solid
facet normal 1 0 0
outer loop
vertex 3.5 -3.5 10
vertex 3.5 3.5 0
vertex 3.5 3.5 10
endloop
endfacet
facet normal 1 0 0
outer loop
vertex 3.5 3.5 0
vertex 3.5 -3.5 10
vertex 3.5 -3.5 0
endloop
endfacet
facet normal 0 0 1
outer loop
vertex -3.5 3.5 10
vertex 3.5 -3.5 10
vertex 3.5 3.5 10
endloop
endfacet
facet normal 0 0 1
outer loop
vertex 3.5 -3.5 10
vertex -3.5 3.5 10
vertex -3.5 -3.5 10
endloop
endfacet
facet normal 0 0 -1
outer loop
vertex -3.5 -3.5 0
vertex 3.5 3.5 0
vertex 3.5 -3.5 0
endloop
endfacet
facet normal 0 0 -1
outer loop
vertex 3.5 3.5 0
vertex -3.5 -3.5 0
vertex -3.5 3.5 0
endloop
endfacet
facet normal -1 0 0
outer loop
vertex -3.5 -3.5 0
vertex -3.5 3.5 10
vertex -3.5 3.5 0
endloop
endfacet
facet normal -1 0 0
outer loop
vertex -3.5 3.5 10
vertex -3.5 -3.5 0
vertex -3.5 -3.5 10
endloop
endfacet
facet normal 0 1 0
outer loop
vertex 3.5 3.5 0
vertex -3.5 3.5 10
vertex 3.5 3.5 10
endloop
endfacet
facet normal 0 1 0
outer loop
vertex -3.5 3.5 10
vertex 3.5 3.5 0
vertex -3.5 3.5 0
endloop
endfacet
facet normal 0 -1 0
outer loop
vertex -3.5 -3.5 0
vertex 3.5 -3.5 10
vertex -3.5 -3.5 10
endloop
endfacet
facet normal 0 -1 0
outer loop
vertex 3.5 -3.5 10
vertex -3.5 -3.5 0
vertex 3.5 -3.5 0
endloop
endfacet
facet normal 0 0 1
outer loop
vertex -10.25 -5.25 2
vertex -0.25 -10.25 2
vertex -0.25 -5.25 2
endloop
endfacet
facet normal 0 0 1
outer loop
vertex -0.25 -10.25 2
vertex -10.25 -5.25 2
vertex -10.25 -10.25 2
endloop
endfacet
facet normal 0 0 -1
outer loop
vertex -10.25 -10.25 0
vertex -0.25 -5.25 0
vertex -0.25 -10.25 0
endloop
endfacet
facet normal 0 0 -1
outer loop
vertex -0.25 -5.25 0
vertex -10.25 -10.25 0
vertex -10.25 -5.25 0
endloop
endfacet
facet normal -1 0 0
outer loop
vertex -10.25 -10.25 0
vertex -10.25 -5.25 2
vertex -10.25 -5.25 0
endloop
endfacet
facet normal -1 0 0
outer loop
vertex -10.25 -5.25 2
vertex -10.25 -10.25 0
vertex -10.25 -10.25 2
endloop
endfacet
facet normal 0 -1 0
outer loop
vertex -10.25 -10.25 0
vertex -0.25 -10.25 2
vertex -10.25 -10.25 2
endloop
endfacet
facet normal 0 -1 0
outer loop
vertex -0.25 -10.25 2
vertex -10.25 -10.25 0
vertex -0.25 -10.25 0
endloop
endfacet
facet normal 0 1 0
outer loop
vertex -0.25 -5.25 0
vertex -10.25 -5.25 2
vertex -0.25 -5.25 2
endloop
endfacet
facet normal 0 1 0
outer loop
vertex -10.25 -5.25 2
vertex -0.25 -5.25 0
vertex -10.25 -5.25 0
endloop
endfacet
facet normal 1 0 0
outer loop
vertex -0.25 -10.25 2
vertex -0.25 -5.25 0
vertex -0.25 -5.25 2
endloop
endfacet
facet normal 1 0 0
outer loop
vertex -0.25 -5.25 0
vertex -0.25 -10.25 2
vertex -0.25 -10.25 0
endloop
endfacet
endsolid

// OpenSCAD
translate([0, 0, 5]) color([0,1,0,0.9]) cube([7, 7, 10], center=true);
translate([-10.0, -10.0, 1]) color([1,0,0]) cube([0.5, 0.5, 2], center=true);
translate([-10.0, -9.5, 1]) color([1,0,0]) cube([0.5, 0.5, 2], center=true);
translate([-10.0, -9.0, 1]) color([1,0,0]) cube([0.5, 0.5, 2], center=true);
translate([-10.0, -8.5, 1]) color([1,0,0]) cube([0.5, 0.5, 2], center=true);
translate([-10.0, -8.0, 1]) color([1,0,0]) cube([0.5, 0.5, 2], center=true);
translate([-10.0, -7.5, 1]) color([1,0,0]) cube([0.5, 0.5, 2], center=true);
translate([-10.0, -7.0, 1]) color([1,0,0]) cube([0.5, 0.5, 2], center=true);
translate([-10.0, -6.5, 1]) color([1,0,0]) cube([0.5, 0.5, 2], center=true);
translate([-10.0, -6.0, 1]) color([1,0,0]) cube([0.5, 0.5, 2], center=true);
translate([-10.0, -5.5, 1]) color([1,0,0]) cube([0.5, 0.5, 2], center=true);
translate([-9.5, -10.0, 1]) color([1,0,0]) cube([0.5, 0.5, 2], center=true);
translate([-9.5, -9.5, 1]) color([1,0,0]) cube([0.5, 0.5, 2], center=true);
translate([-9.5, -9.0, 1]) color([1,0,0]) cube([0.5, 0.5, 2], center=true);
translate([-9.5, -8.5, 1]) color([1,0,0]) cube([0.5, 0.5, 2], center=true);
translate([-9.5, -8.0, 1]) color([1,0,0]) cube([0.5, 0.5, 2], center=true);
translate([-9.5, -7.5, 1]) color([1,0,0]) cube([0.5, 0.5, 2], center=true);
translate([-9.5, -7.0, 1]) color([1,0,0]) cube([0.5, 0.5, 2], center=true);
translate([-9.5, -6.5, 1]) color([1,0,0]) cube([0.5, 0.5, 2], center=true);
translate([-9.5, -6.0, 1]) color([1,0,0]) cube([0.5, 0.5, 2], center=true);
translate([-9.5, -5.5, 1]) color([1,0,0]) cube([0.5, 0.5, 2], center=true);
translate([-9.0, -10.0, 1]) color([1,0,0]) cube([0.5, 0.5, 2], center=true);
translate([-9.0, -9.5, 1]) color([1,0,0]) cube([0.5, 0.5, 2], center=true);
translate([-9.0, -9.0, 1]) color([1,0,0]) cube([0.5, 0.5, 2], center=true);
translate([-9.0, -8.5, 1]) color([1,0,0]) cube([0.5, 0.5, 2], center=true);
translate([-9.0, -8.0, 1]) color([1,0,0]) cube([0.5, 0.5, 2], center=true);
translate([-9.0, -7.5, 1]) color([1,0,0]) cube([0.5, 0.5, 2], center=true);
translate([-9.0, -7.0, 1]) color([1,0,0]) cube([0.5, 0.5, 2], center=true);
translate([-9.0, -6.5, 1]) color([1,0,0]) cube([0.5, 0.5, 2], center=true);
translate([-9.0, -6.0, 1]) color([1,0,0]) cube([0.5, 0.5, 2], center=true);
translate([-9.0, -5.5, 1]) color([1,0,0]) cube([0.5, 0.5, 2], center=true);
translate([-8.5, -10.0, 1]) color([1,0,0]) cube([0.5, 0.5, 2], center=true);
translate([-8.5, -9.5, 1]) color([1,0,0]) cube([0.5, 0.5, 2], center=true);
translate([-8.5, -9.0, 1]) color([1,0,0]) cube([0.5, 0.5, 2], center=true);
translate([-8.5, -8.5, 1]) color([1,0,0]) cube([0.5, 0.5, 2], center=true);
translate([-8.5, -8.0, 1]) color([1,0,0]) cube([0.5, 0.5, 2], center=true);
translate([-8.5, -7.5, 1]) color([1,0,0]) cube([0.5, 0.5, 2], center=true);
translate([-8.5, -7.0, 1]) color([1,0,0]) cube([0.5, 0.5, 2], center=true);
translate([-8.5, -6.5, 1]) color([1,0,0]) cube([0.5, 0.5, 2], center=true);
translate([-8.5, -6.0, 1]) color([1,0,0]) cube([0.5, 0.5, 2], center=true);
translate([-8.5, -5.5, 1]) color([1,0,0]) cube([0.5, 0.5, 2], center=true);
translate([-8.0, -10.0, 1]) color([1,0,0]) cube([0.5, 0.5, 2], center=true);
translate([-8.0, -9.5, 1]) color([1,0,0]) cube([0.5, 0.5, 2], center=true);
translate([-8.0, -9.0, 1]) color([1,0,0]) cube([0.5, 0.5, 2], center=true);
translate([-8.0, -8.5, 1]) color([1,0,0]) cube([0.5, 0.5, 2], center=true);
translate([-8.0, -8.0, 1]) color([1,0,0]) cube([0.5, 0.5, 2], center=true);
translate([-8.0, -7.5, 1]) color([1,0,0]) cube([0.5, 0.5, 2], center=true);
translate([-8.0, -7.0, 1]) color([1,0,0]) cube([0.5, 0.5, 2], center=true);
translate([-8.0, -6.5, 1]) color([1,0,0]) cube([0.5, 0.5, 2], center=true);
translate([-8.0, -6.0, 1]) color([1,0,0]) cube([0.5, 0.5, 2], center=true);
translate([-8.0, -5.5, 1]) color([1,0,0]) cube([0.5, 0.5, 2], center=true);
translate([-7.5, -10.0, 1]) color([1,0,0]) cube([0.5, 0.5, 2], center=true);
translate([-7.5, -9.5, 1]) color([1,0,0]) cube([0.5, 0.5, 2], center=true);
translate([-7.5, -9.0, 1]) color([1,0,0]) cube([0.5, 0.5, 2], center=true);
translate([-7.5, -8.5, 1]) color([1,0,0]) cube([0.5, 0.5, 2], center=true);
translate([-7.5, -8.0, 1]) color([1,0,0]) cube([0.5, 0.5, 2], center=true);
translate([-7.5, -7.5, 1]) color([1,0,0]) cube([0.5, 0.5, 2], center=true);
translate([-7.5, -7.0, 1]) color([1,0,0]) cube([0.5, 0.5, 2], center=true);
translate([-7.5, -6.5, 1]) color([1,0,0]) cube([0.5, 0.5, 2], center=true);
translate([-7.5, -6.0, 1]) color([1,0,0]) cube([0.5, 0.5, 2], center=true);
translate([-7.5, -5.5, 1]) color([1,0,0]) cube([0.5, 0.5, 2], center=true);
translate([-7.0, -10.0, 1]) color([1,0,0]) cube([0.5, 0.5, 2], center=true);
translate([-7.0, -9.5, 1]) color([1,0,0]) cube([0.5, 0.5, 2], center=true);
translate([-7.0, -9.0, 1]) color([1,0,0]) cube([0.5, 0.5, 2], center=true);
translate([-7.0, -8.5, 1]) color([1,0,0]) cube([0.5, 0.5, 2], center=true);
translate([-7.0, -8.0, 1]) color([1,0,0]) cube([0.5, 0.5, 2], center=true);
translate([-7.0, -7.5, 1]) color([1,0,0]) cube([0.5, 0.5, 2], center=true);
translate([-7.0, -7.0, 1]) color([1,0,0]) cube([0.5, 0.5, 2], center=true);
translate([-7.0, -6.5, 1]) color([1,0,0]) cube([0.5, 0.5, 2], center=true);
translate([-7.0, -6.0, 1]) color([1,0,0]) cube([0.5, 0.5, 2], center=true);
translate([-7.0, -5.5, 1]) color([1,0,0]) cube([0.5, 0.5, 2], center=true);
translate([-6.5, -10.0, 1]) color([1,0,0]) cube([0.5, 0.5, 2], center=true);
translate([-6.5, -9.5, 1]) color([1,0,0]) cube([0.5, 0.5, 2], center=true);
translate([-6.5, -9.0, 1]) color([1,0,0]) cube([0.5, 0.5, 2], center=true);
translate([-6.5, -8.5, 1]) color([1,0,0]) cube([0.5, 0.5, 2], center=true);
translate([-6.5, -8.0, 1]) color([1,0,0]) cube([0.5, 0.5, 2], center=true);
translate([-6.5, -7.5, 1]) color([1,0,0]) cube([0.5, 0.5, 2], center=true);
translate([-6.5, -7.0, 1]) color([1,0,0]) cube([0.5, 0.5, 2], center=true);
translate([-6.5, -6.5, 1]) color([1,0,0]) cube([0.5, 0.5, 2], center=true);
translate([-6.5, -6.0, 1]) color([1,0,0]) cube([0.5, 0.5, 2], center=true);
translate([-6.5, -5.5, 1]) color([1,0,0]) cube([0.5, 0.5, 2], center=true);
translate([-6.0, -10.0, 1]) color([1,0,0]) cube([0.5, 0.5, 2], center=true);
translate([-6.0, -9.5, 1]) color([1,0,0]) cube([0.5, 0.5, 2], center=true);
translate([-6.0, -9.0, 1]) color([1,0,0]) cube([0.5, 0.5, 2], center=true);
translate([-6.0, -8.5, 1]) color([1,0,0]) cube([0.5, 0.5, 2], center=true);
translate([-6.0, -8.0, 1]) color([1,0,0]) cube([0.5, 0.5, 2], center=true);
translate([-6.0, -7.5, 1]) color([1,0,0]) cube([0.5, 0.5, 2], center=true);
translate([-6.0, -7.0, 1]) color([1,0,0]) cube([0.5, 0.5, 2], center=true);
translate([-6.0, -6.5, 1]) color([1,0,0]) cube([0.5, 0.5, 2], center=true);
translate([-6.0, -6.0, 1]) color([1,0,0]) cube([0.5, 0.5, 2], center=true);
translate([-6.0, -5.5, 1]) color([1,0,0]) cube([0.5, 0.5, 2], center=true);
translate([-5.5, -10.0, 1]) color([1,0,0]) cube([0.5, 0.5, 2], center=true);
translate([-5.5, -9.5, 1]) color([1,0,0]) cube([0.5, 0.5, 2], center=true);
translate([-5.5, -9.0, 1]) color([1,0,0]) cube([0.5, 0.5, 2], center=true);
translate([-5.5, -8.5, 1]) color([1,0,0]) cube([0.5, 0.5, 2], center=true);
translate([-5.5, -8.0, 1]) color([1,0,0]) cube([0.5, 0.5, 2], center=true);
translate([-5.5, -7.5, 1]) color([1,0,0]) cube([0.5, 0.5, 2], center=true);
translate([-5.5, -7.0, 1]) color([1,0,0]) cube([0.5, 0.5, 2], center=true);
translate([-5.5, -6.5, 1]) color([1,0,0]) cube([0.5, 0.5, 2], center=true);
translate([-5.5, -6.0, 1]) color([1,0,0]) cube([0.5, 0.5, 2], center=true);
translate([-5.5, -5.5, 1]) color([1,0,0]) cube([0.5, 0.5, 2], center=true);
translate([-5.0, -10.0, 1]) color([1,0,0]) cube([0.5, 0.5, 2], center=true);
translate([-5.0, -9.5, 1]) color([1,0,0]) cube([0.5, 0.5, 2], center=true);
translate([-5.0, -9.0, 1]) color([1,0,0]) cube([0.5, 0.5, 2], center=true);
translate([-5.0, -8.5, 1]) color([1,0,0]) cube([0.5, 0.5, 2], center=true);
translate([-5.0, -8.0, 1]) color([1,0,0]) cube([0.5, 0.5, 2], center=true);
translate([-5.0, -7.5, 1]) color([1,0,0]) cube([0.5, 0.5, 2], center=true);
translate([-5.0, -7.0, 1]) color([1,0,0]) cube([0.5, 0.5, 2], center=true);
translate([-5.0, -6.5, 1]) color([1,0,0]) cube([0.5, 0.5, 2], center=true);
translate([-5.0, -6.0, 1]) color([1,0,0]) cube([0.5, 0.5, 2], center=true);
translate([-5.0, -5.5, 1]) color([1,0,0]) cube([0.5, 0.5, 2], center=true);
translate([-4.5, -10.0, 1]) color([1,0,0]) cube([0.5, 0.5, 2], center=true);
translate([-4.5, -9.5, 1]) color([1,0,0]) cube([0.5, 0.5, 2], center=true);
translate([-4.5, -9.0, 1]) color([1,0,0]) cube([0.5, 0.5, 2], center=true);
translate([-4.5, -8.5, 1]) color([1,0,0]) cube([0.5, 0.5, 2], center=true);
translate([-4.5, -8.0, 1]) color([1,0,0]) cube([0.5, 0.5, 2], center=true);
translate([-4.5, -7.5, 1]) color([1,0,0]) cube([0.5, 0.5, 2], center=true);
translate([-4.5, -7.0, 1]) color([1,0,0]) cube([0.5, 0.5, 2], center=true);
translate([-4.5, -6.5, 1]) color([1,0,0]) cube([0.5, 0.5, 2], center=true);
translate([-4.5, -6.0, 1]) color([1,0,0]) cube([0.5, 0.5, 2], center=true);
translate([-4.5, -5.5, 1]) color([1,0,0]) cube([0.5, 0.5, 2], center=true);
translate([-4.0, -10.0, 1]) color([1,0,0]) cube([0.5, 0.5, 2], center=true);
translate([-4.0, -9.5, 1]) color([1,0,0]) cube([0.5, 0.5, 2], center=true);
translate([-4.0, -9.0, 1]) color([1,0,0]) cube([0.5, 0.5, 2], center=true);
translate([-4.0, -8.5, 1]) color([1,0,0]) cube([0.5, 0.5, 2], center=true);
translate([-4.0, -8.0, 1]) color([1,0,0]) cube([0.5, 0.5, 2], center=true);
translate([-4.0, -7.5, 1]) color([1,0,0]) cube([0.5, 0.5, 2], center=true);
translate([-4.0, -7.0, 1]) color([1,0,0]) cube([0.5, 0.5, 2], center=true);
translate([-4.0, -6.5, 1]) color([1,0,0]) cube([0.5, 0.5, 2], center=true);
translate([-4.0, -6.0, 1]) color([1,0,0]) cube([0.5, 0.5, 2], center=true);
translate([-4.0, -5.5, 1]) color([1,0,0]) cube([0.5, 0.5, 2], center=true);
translate([-3.5, -10.0, 1]) color([1,0,0]) cube([0.5, 0.5, 2], center=true);
translate([-3.5, -9.5, 1]) color([1,0,0]) cube([0.5, 0.5, 2], center=true);
translate([-3.5, -9.0, 1]) color([1,0,0]) cube([0.5, 0.5, 2], center=true);
translate([-3.5, -8.5, 1]) color([1,0,0]) cube([0.5, 0.5, 2], center=true);
translate([-3.5, -8.0, 1]) color([1,0,0]) cube([0.5, 0.5, 2], center=true);
translate([-3.5, -7.5, 1]) color([1,0,0]) cube([0.5, 0.5, 2], center=true);
translate([-3.5, -7.0, 1]) color([1,0,0]) cube([0.5, 0.5, 2], center=true);
translate([-3.5, -6.5, 1]) color([1,0,0]) cube([0.5, 0.5, 2], center=true);
translate([-3.5, -6.0, 1]) color([1,0,0]) cube([0.5, 0.5, 2], center=true);
translate([-3.5, -5.5, 1]) color([1,0,0]) cube([0.5, 0.5, 2], center=true);
translate([-3.0, -10.0, 1]) color([1,0,0]) cube([0.5, 0.5, 2], center=true);
translate([-3.0, -9.5, 1]) color([1,0,0]) cube([0.5, 0.5, 2], center=true);
translate([-3.0, -9.0, 1]) color([1,0,0]) cube([0.5, 0.5, 2], center=true);
translate([-3.0, -8.5, 1]) color([1,0,0]) cube([0.5, 0.5, 2], center=true);
translate([-3.0, -8.0, 1]) color([1,0,0]) cube([0.5, 0.5, 2], center=true);
translate([-3.0, -7.5, 1]) color([1,0,0]) cube([0.5, 0.5, 2], center=true);
translate([-3.0, -7.0, 1]) color([1,0,0]) cube([0.5, 0.5, 2], center=true);
translate([-3.0, -6.5, 1]) color([1,0,0]) cube([0.5, 0.5, 2], center=true);
translate([-3.0, -6.0, 1]) color([1,0,0]) cube([0.5, 0.5, 2], center=true);
translate([-3.0, -5.5, 1]) color([1,0,0]) cube([0.5, 0.5, 2], center=true);
translate([-2.5, -10.0, 1]) color([1,0,0]) cube([0.5, 0.5, 2], center=true);
translate([-2.5, -9.5, 1]) color([1,0,0]) cube([0.5, 0.5, 2], center=true);
translate([-2.5, -9.0, 1]) color([1,0,0]) cube([0.5, 0.5, 2], center=true);
translate([-2.5, -8.5, 1]) color([1,0,0]) cube([0.5, 0.5, 2], center=true);
translate([-2.5, -8.0, 1]) color([1,0,0]) cube([0.5, 0.5, 2], center=true);
translate([-2.5, -7.5, 1]) color([1,0,0]) cube([0.5, 0.5, 2], center=true);
translate([-2.5, -7.0, 1]) color([1,0,0]) cube([0.5, 0.5, 2], center=true);
translate([-2.5, -6.5, 1]) color([1,0,0]) cube([0.5, 0.5, 2], center=true);
translate([-2.5, -6.0, 1]) color([1,0,0]) cube([0.5, 0.5, 2], center=true);
translate([-2.5, -5.5, 1]) color([1,0,0]) cube([0.5, 0.5, 2], center=true);
translate([-2.0, -10.0, 1]) color([1,0,0]) cube([0.5, 0.5, 2], center=true);
translate([-2.0, -9.5, 1]) color([1,0,0]) cube([0.5, 0.5, 2], center=true);
translate([-2.0, -9.0, 1]) color([1,0,0]) cube([0.5, 0.5, 2], center=true);
translate([-2.0, -8.5, 1]) color([1,0,0]) cube([0.5, 0.5, 2], center=true);
translate([-2.0, -8.0, 1]) color([1,0,0]) cube([0.5, 0.5, 2], center=true);
translate([-2.0, -7.5, 1]) color([1,0,0]) cube([0.5, 0.5, 2], center=true);
translate([-2.0, -7.0, 1]) color([1,0,0]) cube([0.5, 0.5, 2], center=true);
translate([-2.0, -6.5, 1]) color([1,0,0]) cube([0.5, 0.5, 2], center=true);
translate([-2.0, -6.0, 1]) color([1,0,0]) cube([0.5, 0.5, 2], center=true);
translate([-2.0, -5.5, 1]) color([1,0,0]) cube([0.5, 0.5, 2], center=true);
translate([-1.5, -10.0, 1]) color([1,0,0]) cube([0.5, 0.5, 2], center=true);
translate([-1.5, -9.5, 1]) color([1,0,0]) cube([0.5, 0.5, 2], center=true);
translate([-1.5, -9.0, 1]) color([1,0,0]) cube([0.5, 0.5, 2], center=true);
translate([-1.5, -8.5, 1]) color([1,0,0]) cube([0.5, 0.5, 2], center=true);
translate([-1.5, -8.0, 1]) color([1,0,0]) cube([0.5, 0.5, 2], center=true);
translate([-1.5, -7.5, 1]) color([1,0,0]) cube([0.5, 0.5, 2], center=true);
translate([-1.5, -7.0, 1]) color([1,0,0]) cube([0.5, 0.5, 2], center=true);
translate([-1.5, -6.5, 1]) color([1,0,0]) cube([0.5, 0.5, 2], center=true);
translate([-1.5, -6.0, 1]) color([1,0,0]) cube([0.5, 0.5, 2], center=true);
translate([-1.5, -5.5, 1]) color([1,0,0]) cube([0.5, 0.5, 2], center=true);
translate([-1.0, -10.0, 1]) color([1,0,0]) cube([0.5, 0.5, 2], center=true);
translate([-1.0, -9.5, 1]) color([1,0,0]) cube([0.5, 0.5, 2], center=true);
translate([-1.0, -9.0, 1]) color([1,0,0]) cube([0.5, 0.5, 2], center=true);
translate([-1.0, -8.5, 1]) color([1,0,0]) cube([0.5, 0.5, 2], center=true);
translate([-1.0, -8.0, 1]) color([1,0,0]) cube([0.5, 0.5, 2], center=true);
translate([-1.0, -7.5, 1]) color([1,0,0]) cube([0.5, 0.5, 2], center=true);
translate([-1.0, -7.0, 1]) color([1,0,0]) cube([0.5, 0.5, 2], center=true);
translate([-1.0, -6.5, 1]) color([1,0,0]) cube([0.5, 0.5, 2], center=true);
translate([-1.0, -6.0, 1]) color([1,0,0]) cube([0.5, 0.5, 2], center=true);
translate([-1.0, -5.5, 1]) color([1,0,0]) cube([0.5, 0.5, 2], center=true);
translate([-0.5, -10.0, 1]) color([1,0,0]) cube([0.5, 0.5, 2], center=true);
translate([-0.5, -9.5, 1]) color([1,0,0]) cube([0.5, 0.5, 2], center=true);
translate([-0.5, -9.0, 1]) color([1,0,0]) cube([0.5, 0.5, 2], center=true);
translate([-0.5, -8.5, 1]) color([1,0,0]) cube([0.5, 0.5, 2], center=true);
translate([-0.5, -8.0, 1]) color([1,0,0]) cube([0.5, 0.5, 2], center=true);
translate([-0.5, -7.5, 1]) color([1,0,0]) cube([0.5, 0.5, 2], center=true);
translate([-0.5, -7.0, 1]) color([1,0,0]) cube([0.5, 0.5, 2], center=true);
translate([-0.5, -6.5, 1]) color([1,0,0]) cube([0.5, 0.5, 2], center=true);
translate([-0.5, -6.0, 1]) color([1,0,0]) cube([0.5, 0.5, 2], center=true);
translate([-0.5, -5.5, 1]) color([1,0,0]) cube([0.5, 0.5, 2], center=true);
